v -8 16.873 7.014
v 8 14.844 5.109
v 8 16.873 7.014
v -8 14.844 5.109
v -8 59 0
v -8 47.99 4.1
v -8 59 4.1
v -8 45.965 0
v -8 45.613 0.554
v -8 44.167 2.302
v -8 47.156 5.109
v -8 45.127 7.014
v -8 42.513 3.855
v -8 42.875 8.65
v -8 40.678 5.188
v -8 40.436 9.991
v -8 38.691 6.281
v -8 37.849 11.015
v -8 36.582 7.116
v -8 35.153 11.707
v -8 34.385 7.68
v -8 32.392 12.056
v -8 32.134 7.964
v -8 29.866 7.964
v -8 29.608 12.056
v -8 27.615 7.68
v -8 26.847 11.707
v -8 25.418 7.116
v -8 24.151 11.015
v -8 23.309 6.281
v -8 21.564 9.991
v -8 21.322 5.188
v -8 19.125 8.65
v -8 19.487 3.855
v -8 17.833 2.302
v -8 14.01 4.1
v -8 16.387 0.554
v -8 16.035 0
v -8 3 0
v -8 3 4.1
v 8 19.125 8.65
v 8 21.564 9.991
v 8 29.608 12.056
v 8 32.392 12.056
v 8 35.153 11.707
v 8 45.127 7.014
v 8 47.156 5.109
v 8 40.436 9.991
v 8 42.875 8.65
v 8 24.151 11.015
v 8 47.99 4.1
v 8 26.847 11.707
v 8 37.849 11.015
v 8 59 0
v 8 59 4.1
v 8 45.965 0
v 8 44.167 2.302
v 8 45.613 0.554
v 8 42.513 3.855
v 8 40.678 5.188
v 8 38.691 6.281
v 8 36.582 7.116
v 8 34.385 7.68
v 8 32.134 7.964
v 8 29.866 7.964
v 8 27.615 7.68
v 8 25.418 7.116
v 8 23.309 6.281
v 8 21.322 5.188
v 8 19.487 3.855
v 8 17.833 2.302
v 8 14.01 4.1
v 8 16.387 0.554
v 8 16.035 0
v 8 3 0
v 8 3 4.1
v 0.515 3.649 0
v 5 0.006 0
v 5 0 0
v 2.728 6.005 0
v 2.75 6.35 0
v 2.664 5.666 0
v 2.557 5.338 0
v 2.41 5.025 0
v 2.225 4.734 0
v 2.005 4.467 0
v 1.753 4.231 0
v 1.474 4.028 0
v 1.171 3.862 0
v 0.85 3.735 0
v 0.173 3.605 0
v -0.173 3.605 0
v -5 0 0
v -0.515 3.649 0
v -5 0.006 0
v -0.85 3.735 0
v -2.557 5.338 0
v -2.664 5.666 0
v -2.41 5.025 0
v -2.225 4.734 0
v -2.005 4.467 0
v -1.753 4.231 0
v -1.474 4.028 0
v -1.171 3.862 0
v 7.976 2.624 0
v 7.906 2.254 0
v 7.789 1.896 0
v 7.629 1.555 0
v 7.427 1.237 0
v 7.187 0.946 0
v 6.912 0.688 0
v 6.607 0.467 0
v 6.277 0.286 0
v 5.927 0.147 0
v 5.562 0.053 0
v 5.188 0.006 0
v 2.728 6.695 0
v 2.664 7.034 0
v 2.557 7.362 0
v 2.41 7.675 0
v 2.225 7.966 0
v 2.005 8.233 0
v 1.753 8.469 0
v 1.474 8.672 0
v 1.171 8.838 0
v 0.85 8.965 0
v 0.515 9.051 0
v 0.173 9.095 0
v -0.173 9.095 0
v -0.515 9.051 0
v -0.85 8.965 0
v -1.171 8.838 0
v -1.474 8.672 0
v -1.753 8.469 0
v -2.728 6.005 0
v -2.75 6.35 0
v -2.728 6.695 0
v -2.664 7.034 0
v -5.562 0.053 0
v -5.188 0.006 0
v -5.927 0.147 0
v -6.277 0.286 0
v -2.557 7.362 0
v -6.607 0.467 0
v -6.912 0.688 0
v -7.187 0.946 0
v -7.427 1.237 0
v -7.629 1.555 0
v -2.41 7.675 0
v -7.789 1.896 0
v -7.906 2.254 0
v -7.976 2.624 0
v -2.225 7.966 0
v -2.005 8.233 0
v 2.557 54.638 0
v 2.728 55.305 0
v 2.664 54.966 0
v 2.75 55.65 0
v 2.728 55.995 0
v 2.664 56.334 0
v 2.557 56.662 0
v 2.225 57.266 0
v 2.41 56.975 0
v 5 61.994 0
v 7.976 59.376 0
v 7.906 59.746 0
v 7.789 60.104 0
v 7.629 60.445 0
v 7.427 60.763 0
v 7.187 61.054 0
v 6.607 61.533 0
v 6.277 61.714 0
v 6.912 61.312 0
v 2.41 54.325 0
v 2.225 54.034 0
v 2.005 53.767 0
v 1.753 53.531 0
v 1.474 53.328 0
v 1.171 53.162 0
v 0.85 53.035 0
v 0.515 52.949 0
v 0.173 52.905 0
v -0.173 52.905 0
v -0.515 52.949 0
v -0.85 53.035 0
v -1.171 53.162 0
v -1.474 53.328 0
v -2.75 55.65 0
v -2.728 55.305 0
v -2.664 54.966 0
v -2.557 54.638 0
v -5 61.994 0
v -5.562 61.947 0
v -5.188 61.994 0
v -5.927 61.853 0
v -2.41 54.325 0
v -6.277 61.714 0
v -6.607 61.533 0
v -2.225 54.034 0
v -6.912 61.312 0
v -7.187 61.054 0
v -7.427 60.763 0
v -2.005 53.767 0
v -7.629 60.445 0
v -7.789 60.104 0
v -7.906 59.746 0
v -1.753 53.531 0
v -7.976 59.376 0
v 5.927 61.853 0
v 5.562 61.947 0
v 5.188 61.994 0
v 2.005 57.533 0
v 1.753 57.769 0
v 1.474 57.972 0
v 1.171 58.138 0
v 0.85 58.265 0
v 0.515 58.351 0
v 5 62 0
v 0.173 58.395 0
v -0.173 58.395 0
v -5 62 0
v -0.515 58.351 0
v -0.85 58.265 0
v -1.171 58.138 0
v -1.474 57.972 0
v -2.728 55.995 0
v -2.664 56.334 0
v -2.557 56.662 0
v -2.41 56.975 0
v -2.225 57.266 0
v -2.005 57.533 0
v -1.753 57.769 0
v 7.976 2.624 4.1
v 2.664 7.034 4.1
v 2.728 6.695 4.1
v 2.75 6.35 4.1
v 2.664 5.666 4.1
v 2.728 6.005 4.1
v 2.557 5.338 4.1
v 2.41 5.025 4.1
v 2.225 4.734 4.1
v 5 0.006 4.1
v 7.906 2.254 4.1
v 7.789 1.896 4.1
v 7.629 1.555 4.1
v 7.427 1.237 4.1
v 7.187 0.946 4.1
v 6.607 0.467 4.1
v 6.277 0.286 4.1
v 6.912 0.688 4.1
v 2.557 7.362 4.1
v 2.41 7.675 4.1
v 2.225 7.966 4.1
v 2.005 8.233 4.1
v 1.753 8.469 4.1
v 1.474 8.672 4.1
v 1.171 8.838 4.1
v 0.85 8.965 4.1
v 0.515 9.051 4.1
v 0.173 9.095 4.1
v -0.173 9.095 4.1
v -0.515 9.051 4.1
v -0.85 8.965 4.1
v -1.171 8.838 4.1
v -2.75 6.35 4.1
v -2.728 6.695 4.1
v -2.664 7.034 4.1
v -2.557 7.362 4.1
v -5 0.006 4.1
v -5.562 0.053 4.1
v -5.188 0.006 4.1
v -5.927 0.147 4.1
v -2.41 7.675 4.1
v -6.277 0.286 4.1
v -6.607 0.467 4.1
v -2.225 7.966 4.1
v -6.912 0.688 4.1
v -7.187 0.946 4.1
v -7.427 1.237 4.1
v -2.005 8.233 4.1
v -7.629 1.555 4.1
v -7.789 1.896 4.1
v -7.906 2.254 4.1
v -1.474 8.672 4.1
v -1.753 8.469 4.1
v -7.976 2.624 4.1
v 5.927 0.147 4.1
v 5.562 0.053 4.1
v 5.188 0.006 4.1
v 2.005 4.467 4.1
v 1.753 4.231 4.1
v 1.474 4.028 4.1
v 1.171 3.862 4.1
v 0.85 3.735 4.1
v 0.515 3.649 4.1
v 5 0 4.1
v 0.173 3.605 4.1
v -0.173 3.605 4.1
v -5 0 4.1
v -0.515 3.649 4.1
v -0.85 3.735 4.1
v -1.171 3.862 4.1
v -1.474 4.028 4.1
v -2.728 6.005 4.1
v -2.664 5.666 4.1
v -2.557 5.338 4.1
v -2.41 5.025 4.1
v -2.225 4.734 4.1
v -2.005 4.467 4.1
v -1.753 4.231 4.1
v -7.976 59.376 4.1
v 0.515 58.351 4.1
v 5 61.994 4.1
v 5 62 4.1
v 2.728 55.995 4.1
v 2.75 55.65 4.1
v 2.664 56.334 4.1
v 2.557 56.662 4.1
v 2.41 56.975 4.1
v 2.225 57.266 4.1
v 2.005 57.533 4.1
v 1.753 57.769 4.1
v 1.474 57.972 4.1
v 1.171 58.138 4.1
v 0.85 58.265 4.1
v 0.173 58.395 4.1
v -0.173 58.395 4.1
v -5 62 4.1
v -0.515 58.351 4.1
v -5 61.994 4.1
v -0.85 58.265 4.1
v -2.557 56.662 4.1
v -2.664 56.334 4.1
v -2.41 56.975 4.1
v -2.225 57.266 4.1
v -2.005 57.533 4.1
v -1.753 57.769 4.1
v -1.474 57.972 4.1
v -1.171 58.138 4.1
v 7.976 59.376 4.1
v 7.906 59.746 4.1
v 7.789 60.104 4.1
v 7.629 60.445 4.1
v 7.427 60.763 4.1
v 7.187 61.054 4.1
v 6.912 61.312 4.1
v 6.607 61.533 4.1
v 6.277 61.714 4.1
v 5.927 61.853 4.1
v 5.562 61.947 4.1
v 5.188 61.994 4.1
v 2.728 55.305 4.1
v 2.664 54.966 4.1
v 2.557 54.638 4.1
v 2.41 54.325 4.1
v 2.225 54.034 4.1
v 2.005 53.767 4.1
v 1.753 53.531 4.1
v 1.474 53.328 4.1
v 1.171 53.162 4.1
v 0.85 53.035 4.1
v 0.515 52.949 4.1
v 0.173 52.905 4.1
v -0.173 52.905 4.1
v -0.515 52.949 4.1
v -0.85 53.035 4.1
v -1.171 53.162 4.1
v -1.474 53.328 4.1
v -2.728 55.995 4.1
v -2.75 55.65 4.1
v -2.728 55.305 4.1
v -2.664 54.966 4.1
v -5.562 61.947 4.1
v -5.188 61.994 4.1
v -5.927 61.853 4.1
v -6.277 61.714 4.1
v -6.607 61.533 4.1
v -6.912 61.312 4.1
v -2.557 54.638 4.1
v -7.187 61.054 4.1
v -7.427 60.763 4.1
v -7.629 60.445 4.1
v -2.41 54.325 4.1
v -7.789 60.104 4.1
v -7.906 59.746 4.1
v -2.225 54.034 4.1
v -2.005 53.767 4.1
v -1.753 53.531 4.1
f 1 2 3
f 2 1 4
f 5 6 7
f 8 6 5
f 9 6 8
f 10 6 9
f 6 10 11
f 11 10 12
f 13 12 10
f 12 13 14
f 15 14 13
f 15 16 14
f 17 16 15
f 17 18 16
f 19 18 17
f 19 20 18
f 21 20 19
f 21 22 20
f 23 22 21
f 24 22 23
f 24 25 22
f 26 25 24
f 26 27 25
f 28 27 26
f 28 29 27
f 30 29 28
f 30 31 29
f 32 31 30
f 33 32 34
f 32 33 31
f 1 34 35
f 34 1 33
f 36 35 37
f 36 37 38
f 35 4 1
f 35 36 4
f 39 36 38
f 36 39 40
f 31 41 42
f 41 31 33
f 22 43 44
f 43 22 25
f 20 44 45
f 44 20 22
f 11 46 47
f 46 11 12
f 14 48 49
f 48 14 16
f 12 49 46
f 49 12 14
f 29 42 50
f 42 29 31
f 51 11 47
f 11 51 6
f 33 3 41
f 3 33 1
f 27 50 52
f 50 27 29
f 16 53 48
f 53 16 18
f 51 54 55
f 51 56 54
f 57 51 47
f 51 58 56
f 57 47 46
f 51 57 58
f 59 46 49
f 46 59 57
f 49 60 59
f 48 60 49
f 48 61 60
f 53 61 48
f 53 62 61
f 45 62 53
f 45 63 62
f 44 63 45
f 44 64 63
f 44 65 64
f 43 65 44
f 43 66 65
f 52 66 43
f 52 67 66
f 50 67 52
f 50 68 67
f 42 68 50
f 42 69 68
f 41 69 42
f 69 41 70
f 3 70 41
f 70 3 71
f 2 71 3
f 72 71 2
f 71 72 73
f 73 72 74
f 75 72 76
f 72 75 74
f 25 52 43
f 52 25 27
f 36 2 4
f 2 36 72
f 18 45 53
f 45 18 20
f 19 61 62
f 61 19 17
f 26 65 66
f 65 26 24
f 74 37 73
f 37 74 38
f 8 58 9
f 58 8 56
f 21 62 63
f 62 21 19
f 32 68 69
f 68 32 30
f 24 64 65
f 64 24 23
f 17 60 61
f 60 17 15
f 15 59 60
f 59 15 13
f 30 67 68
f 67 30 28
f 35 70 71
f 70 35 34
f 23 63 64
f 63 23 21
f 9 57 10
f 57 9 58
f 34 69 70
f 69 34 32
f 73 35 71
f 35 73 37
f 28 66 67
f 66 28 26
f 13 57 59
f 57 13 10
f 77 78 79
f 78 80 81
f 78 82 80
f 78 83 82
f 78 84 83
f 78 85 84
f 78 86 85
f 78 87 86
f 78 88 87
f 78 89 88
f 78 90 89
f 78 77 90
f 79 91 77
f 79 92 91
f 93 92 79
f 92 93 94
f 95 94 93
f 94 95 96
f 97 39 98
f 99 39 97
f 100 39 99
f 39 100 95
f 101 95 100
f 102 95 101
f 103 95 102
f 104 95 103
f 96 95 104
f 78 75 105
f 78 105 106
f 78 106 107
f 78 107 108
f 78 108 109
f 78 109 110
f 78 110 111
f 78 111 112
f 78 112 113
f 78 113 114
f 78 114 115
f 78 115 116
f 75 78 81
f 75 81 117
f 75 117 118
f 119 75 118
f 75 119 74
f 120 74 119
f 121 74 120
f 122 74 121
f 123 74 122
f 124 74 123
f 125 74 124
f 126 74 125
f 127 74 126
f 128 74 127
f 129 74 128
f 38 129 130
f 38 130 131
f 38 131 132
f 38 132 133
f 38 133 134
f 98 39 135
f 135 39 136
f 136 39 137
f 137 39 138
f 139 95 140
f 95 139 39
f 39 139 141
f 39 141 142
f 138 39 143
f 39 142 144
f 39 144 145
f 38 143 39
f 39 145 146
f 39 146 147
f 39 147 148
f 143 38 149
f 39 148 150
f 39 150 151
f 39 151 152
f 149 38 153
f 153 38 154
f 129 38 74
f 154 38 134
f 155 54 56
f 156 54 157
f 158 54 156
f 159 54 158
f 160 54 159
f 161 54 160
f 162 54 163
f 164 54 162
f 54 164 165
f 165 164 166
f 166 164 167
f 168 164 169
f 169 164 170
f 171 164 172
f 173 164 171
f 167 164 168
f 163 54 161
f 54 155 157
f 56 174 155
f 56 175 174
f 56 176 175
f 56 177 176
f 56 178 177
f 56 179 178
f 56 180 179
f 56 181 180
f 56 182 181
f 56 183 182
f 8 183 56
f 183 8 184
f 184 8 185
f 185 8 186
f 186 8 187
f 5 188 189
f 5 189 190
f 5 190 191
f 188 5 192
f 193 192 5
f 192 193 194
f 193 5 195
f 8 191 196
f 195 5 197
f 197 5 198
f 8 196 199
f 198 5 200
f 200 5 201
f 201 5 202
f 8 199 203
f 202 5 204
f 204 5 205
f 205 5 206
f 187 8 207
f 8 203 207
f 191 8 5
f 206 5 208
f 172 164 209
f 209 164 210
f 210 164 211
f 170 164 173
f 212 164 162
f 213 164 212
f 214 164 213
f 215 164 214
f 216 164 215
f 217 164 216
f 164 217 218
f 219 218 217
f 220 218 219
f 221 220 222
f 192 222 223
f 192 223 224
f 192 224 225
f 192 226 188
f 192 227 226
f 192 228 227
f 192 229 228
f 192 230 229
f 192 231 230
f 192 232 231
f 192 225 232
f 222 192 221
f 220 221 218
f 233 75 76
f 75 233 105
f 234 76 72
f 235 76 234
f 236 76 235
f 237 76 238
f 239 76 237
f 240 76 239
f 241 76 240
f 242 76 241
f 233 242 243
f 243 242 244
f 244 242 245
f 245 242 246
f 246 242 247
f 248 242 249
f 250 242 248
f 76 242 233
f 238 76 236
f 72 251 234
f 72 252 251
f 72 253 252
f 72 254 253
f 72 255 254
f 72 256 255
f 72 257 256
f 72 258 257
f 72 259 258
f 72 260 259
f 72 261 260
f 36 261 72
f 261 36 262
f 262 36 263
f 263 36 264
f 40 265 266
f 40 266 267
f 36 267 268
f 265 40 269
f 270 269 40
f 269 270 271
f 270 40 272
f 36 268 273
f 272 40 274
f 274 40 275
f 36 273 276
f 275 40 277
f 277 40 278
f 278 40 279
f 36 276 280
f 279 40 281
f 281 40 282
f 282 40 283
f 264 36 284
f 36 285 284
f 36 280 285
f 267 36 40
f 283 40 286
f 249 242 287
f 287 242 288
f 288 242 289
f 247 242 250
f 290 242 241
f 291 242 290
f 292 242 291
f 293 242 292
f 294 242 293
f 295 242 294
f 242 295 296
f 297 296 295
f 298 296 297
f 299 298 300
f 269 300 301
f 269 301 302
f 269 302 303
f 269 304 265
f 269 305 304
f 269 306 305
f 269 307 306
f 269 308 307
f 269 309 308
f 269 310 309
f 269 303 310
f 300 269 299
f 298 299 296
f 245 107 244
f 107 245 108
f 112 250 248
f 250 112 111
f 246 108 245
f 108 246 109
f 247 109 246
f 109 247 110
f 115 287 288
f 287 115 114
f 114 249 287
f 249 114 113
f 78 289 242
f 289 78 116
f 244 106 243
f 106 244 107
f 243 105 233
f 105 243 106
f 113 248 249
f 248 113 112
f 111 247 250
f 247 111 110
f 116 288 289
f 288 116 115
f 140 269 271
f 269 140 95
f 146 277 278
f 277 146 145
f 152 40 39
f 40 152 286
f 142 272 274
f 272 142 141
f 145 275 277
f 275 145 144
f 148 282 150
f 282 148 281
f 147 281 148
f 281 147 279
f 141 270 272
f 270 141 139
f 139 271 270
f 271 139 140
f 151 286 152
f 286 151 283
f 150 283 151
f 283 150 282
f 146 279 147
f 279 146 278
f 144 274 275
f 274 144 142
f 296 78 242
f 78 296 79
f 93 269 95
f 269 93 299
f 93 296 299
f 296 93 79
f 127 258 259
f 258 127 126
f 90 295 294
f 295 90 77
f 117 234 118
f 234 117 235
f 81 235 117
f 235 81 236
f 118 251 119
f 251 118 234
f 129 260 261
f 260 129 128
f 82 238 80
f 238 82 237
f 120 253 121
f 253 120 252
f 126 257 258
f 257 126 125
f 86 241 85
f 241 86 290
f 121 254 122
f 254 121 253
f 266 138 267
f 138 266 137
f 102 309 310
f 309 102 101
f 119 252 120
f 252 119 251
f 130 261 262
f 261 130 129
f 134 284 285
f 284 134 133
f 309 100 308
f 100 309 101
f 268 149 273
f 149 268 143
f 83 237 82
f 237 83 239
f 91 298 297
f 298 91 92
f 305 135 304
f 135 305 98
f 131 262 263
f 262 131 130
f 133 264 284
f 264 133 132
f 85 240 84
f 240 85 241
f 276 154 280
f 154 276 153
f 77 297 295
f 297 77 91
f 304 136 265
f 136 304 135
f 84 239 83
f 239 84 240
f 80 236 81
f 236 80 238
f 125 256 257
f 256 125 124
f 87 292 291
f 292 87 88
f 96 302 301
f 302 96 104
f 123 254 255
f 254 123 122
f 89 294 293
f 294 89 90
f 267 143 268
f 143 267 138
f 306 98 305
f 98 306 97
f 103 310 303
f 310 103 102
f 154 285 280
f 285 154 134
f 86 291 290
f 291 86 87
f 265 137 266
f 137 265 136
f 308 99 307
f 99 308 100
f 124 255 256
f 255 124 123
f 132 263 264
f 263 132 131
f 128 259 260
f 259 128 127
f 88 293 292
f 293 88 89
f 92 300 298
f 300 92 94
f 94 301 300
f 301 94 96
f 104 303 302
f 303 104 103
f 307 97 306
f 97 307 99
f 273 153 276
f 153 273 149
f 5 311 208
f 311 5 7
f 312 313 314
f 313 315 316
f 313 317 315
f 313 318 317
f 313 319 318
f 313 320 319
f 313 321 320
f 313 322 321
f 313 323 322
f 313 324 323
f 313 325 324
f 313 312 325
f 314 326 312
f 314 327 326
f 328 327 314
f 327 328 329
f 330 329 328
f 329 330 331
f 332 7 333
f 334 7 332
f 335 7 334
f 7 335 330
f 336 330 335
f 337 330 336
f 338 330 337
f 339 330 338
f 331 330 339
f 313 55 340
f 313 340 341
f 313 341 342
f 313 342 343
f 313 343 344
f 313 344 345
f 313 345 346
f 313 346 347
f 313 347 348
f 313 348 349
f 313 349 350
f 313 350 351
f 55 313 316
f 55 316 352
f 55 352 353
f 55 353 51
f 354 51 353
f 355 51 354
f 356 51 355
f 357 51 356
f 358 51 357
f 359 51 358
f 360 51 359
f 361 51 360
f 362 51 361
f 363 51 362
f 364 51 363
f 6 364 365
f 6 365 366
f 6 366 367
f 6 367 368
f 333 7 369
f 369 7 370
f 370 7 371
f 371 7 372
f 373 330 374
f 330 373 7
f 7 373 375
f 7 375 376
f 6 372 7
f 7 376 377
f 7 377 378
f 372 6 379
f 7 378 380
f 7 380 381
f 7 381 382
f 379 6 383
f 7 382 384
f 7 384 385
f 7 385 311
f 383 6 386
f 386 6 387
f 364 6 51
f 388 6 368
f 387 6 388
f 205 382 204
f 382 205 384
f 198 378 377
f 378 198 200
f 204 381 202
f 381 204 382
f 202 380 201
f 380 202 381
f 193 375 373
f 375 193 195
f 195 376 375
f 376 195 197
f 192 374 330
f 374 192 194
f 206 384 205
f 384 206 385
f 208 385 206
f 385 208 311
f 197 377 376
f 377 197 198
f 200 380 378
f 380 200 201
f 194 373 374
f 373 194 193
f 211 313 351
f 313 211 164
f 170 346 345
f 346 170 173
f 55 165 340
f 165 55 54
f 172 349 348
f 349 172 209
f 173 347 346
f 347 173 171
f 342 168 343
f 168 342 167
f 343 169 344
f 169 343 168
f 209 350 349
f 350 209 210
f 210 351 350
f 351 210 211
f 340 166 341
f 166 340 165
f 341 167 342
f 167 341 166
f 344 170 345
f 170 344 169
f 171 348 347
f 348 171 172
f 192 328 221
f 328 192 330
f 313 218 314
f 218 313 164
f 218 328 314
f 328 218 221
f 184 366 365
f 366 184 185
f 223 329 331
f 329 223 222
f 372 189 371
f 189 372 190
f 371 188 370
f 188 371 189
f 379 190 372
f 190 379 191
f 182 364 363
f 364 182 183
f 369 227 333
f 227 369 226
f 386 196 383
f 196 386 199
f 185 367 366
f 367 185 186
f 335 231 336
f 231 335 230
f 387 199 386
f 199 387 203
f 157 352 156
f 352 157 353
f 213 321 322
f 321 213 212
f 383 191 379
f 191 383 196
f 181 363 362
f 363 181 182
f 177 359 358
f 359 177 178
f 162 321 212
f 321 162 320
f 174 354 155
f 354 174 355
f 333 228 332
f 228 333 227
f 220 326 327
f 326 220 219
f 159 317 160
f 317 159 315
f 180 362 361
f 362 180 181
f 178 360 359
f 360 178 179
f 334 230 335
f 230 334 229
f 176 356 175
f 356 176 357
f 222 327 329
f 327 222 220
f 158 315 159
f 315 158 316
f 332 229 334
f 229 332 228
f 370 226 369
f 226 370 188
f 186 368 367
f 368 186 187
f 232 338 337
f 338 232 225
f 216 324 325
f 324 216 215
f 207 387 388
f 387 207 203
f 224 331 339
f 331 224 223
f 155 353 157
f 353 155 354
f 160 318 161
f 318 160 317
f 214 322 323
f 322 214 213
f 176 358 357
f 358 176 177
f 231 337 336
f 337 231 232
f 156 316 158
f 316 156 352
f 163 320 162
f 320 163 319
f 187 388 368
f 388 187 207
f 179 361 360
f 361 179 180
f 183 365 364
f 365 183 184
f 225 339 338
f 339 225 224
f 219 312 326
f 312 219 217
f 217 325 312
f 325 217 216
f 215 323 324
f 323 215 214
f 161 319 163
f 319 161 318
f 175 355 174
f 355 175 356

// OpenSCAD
$fn=50; 
corner_radius=3;    // rounded corners
thickness=4.1;      // thickness of material
width=16;           // with of the entire thing
length=16;          // length of end sections
boring_dia=5.5;     // diameter of holes
border=3.6;         // distance of holes from edge
height=12.1;        // overall height of the object
total_length=62;    // duh... exactly that

// no modifications below this line necessary

gap_length=total_length-2*length;
//Kreisabschnitt: r = (a²+h²)/2h
a=gap_length/2;
h=height-thickness;
radius=(a*a+h*h)/(2*h);

module ende(){  
  difference(){
    union(){
      translate([width/2-corner_radius,corner_radius,thickness/2]){
         cylinder(thickness,corner_radius,corner_radius,true);
      }
      translate([-(width/2-corner_radius),corner_radius,thickness/2]){
        cylinder(thickness,corner_radius,corner_radius,true);
      }
      translate([0,corner_radius,thickness/2])
        cube([width-2*corner_radius,2*corner_radius,thickness],true);
      translate([0,(length+corner_radius)/2,thickness/2]){
        cube([width,length-corner_radius,thickness],true);
      }
    };
    translate([0,border+boring_dia/2,0]) cylinder(thickness+5,boring_dia/2,boring_dia/2,true);
    // translate([0,5,0]) cylinder(thickness+5,2,2,true);
  }
}

module mitte(){
    intersection(){
        translate([-gap_length,-gap_length,0]) cube([total_length,total_length,total_length]);
        translate([0,0,-radius+h]) rotate([90,0,0]) difference(){
            cylinder(width,radius+thickness,radius+thickness,true);
            cylinder(width+5,radius,radius,true);
        }
    }
}

translate([0,length+gap_length/2,0]) rotate([0,0,90]) mitte();
ende();
translate([0,total_length,0]){
    rotate([0,0,180]){
        ende();
    }
}    
